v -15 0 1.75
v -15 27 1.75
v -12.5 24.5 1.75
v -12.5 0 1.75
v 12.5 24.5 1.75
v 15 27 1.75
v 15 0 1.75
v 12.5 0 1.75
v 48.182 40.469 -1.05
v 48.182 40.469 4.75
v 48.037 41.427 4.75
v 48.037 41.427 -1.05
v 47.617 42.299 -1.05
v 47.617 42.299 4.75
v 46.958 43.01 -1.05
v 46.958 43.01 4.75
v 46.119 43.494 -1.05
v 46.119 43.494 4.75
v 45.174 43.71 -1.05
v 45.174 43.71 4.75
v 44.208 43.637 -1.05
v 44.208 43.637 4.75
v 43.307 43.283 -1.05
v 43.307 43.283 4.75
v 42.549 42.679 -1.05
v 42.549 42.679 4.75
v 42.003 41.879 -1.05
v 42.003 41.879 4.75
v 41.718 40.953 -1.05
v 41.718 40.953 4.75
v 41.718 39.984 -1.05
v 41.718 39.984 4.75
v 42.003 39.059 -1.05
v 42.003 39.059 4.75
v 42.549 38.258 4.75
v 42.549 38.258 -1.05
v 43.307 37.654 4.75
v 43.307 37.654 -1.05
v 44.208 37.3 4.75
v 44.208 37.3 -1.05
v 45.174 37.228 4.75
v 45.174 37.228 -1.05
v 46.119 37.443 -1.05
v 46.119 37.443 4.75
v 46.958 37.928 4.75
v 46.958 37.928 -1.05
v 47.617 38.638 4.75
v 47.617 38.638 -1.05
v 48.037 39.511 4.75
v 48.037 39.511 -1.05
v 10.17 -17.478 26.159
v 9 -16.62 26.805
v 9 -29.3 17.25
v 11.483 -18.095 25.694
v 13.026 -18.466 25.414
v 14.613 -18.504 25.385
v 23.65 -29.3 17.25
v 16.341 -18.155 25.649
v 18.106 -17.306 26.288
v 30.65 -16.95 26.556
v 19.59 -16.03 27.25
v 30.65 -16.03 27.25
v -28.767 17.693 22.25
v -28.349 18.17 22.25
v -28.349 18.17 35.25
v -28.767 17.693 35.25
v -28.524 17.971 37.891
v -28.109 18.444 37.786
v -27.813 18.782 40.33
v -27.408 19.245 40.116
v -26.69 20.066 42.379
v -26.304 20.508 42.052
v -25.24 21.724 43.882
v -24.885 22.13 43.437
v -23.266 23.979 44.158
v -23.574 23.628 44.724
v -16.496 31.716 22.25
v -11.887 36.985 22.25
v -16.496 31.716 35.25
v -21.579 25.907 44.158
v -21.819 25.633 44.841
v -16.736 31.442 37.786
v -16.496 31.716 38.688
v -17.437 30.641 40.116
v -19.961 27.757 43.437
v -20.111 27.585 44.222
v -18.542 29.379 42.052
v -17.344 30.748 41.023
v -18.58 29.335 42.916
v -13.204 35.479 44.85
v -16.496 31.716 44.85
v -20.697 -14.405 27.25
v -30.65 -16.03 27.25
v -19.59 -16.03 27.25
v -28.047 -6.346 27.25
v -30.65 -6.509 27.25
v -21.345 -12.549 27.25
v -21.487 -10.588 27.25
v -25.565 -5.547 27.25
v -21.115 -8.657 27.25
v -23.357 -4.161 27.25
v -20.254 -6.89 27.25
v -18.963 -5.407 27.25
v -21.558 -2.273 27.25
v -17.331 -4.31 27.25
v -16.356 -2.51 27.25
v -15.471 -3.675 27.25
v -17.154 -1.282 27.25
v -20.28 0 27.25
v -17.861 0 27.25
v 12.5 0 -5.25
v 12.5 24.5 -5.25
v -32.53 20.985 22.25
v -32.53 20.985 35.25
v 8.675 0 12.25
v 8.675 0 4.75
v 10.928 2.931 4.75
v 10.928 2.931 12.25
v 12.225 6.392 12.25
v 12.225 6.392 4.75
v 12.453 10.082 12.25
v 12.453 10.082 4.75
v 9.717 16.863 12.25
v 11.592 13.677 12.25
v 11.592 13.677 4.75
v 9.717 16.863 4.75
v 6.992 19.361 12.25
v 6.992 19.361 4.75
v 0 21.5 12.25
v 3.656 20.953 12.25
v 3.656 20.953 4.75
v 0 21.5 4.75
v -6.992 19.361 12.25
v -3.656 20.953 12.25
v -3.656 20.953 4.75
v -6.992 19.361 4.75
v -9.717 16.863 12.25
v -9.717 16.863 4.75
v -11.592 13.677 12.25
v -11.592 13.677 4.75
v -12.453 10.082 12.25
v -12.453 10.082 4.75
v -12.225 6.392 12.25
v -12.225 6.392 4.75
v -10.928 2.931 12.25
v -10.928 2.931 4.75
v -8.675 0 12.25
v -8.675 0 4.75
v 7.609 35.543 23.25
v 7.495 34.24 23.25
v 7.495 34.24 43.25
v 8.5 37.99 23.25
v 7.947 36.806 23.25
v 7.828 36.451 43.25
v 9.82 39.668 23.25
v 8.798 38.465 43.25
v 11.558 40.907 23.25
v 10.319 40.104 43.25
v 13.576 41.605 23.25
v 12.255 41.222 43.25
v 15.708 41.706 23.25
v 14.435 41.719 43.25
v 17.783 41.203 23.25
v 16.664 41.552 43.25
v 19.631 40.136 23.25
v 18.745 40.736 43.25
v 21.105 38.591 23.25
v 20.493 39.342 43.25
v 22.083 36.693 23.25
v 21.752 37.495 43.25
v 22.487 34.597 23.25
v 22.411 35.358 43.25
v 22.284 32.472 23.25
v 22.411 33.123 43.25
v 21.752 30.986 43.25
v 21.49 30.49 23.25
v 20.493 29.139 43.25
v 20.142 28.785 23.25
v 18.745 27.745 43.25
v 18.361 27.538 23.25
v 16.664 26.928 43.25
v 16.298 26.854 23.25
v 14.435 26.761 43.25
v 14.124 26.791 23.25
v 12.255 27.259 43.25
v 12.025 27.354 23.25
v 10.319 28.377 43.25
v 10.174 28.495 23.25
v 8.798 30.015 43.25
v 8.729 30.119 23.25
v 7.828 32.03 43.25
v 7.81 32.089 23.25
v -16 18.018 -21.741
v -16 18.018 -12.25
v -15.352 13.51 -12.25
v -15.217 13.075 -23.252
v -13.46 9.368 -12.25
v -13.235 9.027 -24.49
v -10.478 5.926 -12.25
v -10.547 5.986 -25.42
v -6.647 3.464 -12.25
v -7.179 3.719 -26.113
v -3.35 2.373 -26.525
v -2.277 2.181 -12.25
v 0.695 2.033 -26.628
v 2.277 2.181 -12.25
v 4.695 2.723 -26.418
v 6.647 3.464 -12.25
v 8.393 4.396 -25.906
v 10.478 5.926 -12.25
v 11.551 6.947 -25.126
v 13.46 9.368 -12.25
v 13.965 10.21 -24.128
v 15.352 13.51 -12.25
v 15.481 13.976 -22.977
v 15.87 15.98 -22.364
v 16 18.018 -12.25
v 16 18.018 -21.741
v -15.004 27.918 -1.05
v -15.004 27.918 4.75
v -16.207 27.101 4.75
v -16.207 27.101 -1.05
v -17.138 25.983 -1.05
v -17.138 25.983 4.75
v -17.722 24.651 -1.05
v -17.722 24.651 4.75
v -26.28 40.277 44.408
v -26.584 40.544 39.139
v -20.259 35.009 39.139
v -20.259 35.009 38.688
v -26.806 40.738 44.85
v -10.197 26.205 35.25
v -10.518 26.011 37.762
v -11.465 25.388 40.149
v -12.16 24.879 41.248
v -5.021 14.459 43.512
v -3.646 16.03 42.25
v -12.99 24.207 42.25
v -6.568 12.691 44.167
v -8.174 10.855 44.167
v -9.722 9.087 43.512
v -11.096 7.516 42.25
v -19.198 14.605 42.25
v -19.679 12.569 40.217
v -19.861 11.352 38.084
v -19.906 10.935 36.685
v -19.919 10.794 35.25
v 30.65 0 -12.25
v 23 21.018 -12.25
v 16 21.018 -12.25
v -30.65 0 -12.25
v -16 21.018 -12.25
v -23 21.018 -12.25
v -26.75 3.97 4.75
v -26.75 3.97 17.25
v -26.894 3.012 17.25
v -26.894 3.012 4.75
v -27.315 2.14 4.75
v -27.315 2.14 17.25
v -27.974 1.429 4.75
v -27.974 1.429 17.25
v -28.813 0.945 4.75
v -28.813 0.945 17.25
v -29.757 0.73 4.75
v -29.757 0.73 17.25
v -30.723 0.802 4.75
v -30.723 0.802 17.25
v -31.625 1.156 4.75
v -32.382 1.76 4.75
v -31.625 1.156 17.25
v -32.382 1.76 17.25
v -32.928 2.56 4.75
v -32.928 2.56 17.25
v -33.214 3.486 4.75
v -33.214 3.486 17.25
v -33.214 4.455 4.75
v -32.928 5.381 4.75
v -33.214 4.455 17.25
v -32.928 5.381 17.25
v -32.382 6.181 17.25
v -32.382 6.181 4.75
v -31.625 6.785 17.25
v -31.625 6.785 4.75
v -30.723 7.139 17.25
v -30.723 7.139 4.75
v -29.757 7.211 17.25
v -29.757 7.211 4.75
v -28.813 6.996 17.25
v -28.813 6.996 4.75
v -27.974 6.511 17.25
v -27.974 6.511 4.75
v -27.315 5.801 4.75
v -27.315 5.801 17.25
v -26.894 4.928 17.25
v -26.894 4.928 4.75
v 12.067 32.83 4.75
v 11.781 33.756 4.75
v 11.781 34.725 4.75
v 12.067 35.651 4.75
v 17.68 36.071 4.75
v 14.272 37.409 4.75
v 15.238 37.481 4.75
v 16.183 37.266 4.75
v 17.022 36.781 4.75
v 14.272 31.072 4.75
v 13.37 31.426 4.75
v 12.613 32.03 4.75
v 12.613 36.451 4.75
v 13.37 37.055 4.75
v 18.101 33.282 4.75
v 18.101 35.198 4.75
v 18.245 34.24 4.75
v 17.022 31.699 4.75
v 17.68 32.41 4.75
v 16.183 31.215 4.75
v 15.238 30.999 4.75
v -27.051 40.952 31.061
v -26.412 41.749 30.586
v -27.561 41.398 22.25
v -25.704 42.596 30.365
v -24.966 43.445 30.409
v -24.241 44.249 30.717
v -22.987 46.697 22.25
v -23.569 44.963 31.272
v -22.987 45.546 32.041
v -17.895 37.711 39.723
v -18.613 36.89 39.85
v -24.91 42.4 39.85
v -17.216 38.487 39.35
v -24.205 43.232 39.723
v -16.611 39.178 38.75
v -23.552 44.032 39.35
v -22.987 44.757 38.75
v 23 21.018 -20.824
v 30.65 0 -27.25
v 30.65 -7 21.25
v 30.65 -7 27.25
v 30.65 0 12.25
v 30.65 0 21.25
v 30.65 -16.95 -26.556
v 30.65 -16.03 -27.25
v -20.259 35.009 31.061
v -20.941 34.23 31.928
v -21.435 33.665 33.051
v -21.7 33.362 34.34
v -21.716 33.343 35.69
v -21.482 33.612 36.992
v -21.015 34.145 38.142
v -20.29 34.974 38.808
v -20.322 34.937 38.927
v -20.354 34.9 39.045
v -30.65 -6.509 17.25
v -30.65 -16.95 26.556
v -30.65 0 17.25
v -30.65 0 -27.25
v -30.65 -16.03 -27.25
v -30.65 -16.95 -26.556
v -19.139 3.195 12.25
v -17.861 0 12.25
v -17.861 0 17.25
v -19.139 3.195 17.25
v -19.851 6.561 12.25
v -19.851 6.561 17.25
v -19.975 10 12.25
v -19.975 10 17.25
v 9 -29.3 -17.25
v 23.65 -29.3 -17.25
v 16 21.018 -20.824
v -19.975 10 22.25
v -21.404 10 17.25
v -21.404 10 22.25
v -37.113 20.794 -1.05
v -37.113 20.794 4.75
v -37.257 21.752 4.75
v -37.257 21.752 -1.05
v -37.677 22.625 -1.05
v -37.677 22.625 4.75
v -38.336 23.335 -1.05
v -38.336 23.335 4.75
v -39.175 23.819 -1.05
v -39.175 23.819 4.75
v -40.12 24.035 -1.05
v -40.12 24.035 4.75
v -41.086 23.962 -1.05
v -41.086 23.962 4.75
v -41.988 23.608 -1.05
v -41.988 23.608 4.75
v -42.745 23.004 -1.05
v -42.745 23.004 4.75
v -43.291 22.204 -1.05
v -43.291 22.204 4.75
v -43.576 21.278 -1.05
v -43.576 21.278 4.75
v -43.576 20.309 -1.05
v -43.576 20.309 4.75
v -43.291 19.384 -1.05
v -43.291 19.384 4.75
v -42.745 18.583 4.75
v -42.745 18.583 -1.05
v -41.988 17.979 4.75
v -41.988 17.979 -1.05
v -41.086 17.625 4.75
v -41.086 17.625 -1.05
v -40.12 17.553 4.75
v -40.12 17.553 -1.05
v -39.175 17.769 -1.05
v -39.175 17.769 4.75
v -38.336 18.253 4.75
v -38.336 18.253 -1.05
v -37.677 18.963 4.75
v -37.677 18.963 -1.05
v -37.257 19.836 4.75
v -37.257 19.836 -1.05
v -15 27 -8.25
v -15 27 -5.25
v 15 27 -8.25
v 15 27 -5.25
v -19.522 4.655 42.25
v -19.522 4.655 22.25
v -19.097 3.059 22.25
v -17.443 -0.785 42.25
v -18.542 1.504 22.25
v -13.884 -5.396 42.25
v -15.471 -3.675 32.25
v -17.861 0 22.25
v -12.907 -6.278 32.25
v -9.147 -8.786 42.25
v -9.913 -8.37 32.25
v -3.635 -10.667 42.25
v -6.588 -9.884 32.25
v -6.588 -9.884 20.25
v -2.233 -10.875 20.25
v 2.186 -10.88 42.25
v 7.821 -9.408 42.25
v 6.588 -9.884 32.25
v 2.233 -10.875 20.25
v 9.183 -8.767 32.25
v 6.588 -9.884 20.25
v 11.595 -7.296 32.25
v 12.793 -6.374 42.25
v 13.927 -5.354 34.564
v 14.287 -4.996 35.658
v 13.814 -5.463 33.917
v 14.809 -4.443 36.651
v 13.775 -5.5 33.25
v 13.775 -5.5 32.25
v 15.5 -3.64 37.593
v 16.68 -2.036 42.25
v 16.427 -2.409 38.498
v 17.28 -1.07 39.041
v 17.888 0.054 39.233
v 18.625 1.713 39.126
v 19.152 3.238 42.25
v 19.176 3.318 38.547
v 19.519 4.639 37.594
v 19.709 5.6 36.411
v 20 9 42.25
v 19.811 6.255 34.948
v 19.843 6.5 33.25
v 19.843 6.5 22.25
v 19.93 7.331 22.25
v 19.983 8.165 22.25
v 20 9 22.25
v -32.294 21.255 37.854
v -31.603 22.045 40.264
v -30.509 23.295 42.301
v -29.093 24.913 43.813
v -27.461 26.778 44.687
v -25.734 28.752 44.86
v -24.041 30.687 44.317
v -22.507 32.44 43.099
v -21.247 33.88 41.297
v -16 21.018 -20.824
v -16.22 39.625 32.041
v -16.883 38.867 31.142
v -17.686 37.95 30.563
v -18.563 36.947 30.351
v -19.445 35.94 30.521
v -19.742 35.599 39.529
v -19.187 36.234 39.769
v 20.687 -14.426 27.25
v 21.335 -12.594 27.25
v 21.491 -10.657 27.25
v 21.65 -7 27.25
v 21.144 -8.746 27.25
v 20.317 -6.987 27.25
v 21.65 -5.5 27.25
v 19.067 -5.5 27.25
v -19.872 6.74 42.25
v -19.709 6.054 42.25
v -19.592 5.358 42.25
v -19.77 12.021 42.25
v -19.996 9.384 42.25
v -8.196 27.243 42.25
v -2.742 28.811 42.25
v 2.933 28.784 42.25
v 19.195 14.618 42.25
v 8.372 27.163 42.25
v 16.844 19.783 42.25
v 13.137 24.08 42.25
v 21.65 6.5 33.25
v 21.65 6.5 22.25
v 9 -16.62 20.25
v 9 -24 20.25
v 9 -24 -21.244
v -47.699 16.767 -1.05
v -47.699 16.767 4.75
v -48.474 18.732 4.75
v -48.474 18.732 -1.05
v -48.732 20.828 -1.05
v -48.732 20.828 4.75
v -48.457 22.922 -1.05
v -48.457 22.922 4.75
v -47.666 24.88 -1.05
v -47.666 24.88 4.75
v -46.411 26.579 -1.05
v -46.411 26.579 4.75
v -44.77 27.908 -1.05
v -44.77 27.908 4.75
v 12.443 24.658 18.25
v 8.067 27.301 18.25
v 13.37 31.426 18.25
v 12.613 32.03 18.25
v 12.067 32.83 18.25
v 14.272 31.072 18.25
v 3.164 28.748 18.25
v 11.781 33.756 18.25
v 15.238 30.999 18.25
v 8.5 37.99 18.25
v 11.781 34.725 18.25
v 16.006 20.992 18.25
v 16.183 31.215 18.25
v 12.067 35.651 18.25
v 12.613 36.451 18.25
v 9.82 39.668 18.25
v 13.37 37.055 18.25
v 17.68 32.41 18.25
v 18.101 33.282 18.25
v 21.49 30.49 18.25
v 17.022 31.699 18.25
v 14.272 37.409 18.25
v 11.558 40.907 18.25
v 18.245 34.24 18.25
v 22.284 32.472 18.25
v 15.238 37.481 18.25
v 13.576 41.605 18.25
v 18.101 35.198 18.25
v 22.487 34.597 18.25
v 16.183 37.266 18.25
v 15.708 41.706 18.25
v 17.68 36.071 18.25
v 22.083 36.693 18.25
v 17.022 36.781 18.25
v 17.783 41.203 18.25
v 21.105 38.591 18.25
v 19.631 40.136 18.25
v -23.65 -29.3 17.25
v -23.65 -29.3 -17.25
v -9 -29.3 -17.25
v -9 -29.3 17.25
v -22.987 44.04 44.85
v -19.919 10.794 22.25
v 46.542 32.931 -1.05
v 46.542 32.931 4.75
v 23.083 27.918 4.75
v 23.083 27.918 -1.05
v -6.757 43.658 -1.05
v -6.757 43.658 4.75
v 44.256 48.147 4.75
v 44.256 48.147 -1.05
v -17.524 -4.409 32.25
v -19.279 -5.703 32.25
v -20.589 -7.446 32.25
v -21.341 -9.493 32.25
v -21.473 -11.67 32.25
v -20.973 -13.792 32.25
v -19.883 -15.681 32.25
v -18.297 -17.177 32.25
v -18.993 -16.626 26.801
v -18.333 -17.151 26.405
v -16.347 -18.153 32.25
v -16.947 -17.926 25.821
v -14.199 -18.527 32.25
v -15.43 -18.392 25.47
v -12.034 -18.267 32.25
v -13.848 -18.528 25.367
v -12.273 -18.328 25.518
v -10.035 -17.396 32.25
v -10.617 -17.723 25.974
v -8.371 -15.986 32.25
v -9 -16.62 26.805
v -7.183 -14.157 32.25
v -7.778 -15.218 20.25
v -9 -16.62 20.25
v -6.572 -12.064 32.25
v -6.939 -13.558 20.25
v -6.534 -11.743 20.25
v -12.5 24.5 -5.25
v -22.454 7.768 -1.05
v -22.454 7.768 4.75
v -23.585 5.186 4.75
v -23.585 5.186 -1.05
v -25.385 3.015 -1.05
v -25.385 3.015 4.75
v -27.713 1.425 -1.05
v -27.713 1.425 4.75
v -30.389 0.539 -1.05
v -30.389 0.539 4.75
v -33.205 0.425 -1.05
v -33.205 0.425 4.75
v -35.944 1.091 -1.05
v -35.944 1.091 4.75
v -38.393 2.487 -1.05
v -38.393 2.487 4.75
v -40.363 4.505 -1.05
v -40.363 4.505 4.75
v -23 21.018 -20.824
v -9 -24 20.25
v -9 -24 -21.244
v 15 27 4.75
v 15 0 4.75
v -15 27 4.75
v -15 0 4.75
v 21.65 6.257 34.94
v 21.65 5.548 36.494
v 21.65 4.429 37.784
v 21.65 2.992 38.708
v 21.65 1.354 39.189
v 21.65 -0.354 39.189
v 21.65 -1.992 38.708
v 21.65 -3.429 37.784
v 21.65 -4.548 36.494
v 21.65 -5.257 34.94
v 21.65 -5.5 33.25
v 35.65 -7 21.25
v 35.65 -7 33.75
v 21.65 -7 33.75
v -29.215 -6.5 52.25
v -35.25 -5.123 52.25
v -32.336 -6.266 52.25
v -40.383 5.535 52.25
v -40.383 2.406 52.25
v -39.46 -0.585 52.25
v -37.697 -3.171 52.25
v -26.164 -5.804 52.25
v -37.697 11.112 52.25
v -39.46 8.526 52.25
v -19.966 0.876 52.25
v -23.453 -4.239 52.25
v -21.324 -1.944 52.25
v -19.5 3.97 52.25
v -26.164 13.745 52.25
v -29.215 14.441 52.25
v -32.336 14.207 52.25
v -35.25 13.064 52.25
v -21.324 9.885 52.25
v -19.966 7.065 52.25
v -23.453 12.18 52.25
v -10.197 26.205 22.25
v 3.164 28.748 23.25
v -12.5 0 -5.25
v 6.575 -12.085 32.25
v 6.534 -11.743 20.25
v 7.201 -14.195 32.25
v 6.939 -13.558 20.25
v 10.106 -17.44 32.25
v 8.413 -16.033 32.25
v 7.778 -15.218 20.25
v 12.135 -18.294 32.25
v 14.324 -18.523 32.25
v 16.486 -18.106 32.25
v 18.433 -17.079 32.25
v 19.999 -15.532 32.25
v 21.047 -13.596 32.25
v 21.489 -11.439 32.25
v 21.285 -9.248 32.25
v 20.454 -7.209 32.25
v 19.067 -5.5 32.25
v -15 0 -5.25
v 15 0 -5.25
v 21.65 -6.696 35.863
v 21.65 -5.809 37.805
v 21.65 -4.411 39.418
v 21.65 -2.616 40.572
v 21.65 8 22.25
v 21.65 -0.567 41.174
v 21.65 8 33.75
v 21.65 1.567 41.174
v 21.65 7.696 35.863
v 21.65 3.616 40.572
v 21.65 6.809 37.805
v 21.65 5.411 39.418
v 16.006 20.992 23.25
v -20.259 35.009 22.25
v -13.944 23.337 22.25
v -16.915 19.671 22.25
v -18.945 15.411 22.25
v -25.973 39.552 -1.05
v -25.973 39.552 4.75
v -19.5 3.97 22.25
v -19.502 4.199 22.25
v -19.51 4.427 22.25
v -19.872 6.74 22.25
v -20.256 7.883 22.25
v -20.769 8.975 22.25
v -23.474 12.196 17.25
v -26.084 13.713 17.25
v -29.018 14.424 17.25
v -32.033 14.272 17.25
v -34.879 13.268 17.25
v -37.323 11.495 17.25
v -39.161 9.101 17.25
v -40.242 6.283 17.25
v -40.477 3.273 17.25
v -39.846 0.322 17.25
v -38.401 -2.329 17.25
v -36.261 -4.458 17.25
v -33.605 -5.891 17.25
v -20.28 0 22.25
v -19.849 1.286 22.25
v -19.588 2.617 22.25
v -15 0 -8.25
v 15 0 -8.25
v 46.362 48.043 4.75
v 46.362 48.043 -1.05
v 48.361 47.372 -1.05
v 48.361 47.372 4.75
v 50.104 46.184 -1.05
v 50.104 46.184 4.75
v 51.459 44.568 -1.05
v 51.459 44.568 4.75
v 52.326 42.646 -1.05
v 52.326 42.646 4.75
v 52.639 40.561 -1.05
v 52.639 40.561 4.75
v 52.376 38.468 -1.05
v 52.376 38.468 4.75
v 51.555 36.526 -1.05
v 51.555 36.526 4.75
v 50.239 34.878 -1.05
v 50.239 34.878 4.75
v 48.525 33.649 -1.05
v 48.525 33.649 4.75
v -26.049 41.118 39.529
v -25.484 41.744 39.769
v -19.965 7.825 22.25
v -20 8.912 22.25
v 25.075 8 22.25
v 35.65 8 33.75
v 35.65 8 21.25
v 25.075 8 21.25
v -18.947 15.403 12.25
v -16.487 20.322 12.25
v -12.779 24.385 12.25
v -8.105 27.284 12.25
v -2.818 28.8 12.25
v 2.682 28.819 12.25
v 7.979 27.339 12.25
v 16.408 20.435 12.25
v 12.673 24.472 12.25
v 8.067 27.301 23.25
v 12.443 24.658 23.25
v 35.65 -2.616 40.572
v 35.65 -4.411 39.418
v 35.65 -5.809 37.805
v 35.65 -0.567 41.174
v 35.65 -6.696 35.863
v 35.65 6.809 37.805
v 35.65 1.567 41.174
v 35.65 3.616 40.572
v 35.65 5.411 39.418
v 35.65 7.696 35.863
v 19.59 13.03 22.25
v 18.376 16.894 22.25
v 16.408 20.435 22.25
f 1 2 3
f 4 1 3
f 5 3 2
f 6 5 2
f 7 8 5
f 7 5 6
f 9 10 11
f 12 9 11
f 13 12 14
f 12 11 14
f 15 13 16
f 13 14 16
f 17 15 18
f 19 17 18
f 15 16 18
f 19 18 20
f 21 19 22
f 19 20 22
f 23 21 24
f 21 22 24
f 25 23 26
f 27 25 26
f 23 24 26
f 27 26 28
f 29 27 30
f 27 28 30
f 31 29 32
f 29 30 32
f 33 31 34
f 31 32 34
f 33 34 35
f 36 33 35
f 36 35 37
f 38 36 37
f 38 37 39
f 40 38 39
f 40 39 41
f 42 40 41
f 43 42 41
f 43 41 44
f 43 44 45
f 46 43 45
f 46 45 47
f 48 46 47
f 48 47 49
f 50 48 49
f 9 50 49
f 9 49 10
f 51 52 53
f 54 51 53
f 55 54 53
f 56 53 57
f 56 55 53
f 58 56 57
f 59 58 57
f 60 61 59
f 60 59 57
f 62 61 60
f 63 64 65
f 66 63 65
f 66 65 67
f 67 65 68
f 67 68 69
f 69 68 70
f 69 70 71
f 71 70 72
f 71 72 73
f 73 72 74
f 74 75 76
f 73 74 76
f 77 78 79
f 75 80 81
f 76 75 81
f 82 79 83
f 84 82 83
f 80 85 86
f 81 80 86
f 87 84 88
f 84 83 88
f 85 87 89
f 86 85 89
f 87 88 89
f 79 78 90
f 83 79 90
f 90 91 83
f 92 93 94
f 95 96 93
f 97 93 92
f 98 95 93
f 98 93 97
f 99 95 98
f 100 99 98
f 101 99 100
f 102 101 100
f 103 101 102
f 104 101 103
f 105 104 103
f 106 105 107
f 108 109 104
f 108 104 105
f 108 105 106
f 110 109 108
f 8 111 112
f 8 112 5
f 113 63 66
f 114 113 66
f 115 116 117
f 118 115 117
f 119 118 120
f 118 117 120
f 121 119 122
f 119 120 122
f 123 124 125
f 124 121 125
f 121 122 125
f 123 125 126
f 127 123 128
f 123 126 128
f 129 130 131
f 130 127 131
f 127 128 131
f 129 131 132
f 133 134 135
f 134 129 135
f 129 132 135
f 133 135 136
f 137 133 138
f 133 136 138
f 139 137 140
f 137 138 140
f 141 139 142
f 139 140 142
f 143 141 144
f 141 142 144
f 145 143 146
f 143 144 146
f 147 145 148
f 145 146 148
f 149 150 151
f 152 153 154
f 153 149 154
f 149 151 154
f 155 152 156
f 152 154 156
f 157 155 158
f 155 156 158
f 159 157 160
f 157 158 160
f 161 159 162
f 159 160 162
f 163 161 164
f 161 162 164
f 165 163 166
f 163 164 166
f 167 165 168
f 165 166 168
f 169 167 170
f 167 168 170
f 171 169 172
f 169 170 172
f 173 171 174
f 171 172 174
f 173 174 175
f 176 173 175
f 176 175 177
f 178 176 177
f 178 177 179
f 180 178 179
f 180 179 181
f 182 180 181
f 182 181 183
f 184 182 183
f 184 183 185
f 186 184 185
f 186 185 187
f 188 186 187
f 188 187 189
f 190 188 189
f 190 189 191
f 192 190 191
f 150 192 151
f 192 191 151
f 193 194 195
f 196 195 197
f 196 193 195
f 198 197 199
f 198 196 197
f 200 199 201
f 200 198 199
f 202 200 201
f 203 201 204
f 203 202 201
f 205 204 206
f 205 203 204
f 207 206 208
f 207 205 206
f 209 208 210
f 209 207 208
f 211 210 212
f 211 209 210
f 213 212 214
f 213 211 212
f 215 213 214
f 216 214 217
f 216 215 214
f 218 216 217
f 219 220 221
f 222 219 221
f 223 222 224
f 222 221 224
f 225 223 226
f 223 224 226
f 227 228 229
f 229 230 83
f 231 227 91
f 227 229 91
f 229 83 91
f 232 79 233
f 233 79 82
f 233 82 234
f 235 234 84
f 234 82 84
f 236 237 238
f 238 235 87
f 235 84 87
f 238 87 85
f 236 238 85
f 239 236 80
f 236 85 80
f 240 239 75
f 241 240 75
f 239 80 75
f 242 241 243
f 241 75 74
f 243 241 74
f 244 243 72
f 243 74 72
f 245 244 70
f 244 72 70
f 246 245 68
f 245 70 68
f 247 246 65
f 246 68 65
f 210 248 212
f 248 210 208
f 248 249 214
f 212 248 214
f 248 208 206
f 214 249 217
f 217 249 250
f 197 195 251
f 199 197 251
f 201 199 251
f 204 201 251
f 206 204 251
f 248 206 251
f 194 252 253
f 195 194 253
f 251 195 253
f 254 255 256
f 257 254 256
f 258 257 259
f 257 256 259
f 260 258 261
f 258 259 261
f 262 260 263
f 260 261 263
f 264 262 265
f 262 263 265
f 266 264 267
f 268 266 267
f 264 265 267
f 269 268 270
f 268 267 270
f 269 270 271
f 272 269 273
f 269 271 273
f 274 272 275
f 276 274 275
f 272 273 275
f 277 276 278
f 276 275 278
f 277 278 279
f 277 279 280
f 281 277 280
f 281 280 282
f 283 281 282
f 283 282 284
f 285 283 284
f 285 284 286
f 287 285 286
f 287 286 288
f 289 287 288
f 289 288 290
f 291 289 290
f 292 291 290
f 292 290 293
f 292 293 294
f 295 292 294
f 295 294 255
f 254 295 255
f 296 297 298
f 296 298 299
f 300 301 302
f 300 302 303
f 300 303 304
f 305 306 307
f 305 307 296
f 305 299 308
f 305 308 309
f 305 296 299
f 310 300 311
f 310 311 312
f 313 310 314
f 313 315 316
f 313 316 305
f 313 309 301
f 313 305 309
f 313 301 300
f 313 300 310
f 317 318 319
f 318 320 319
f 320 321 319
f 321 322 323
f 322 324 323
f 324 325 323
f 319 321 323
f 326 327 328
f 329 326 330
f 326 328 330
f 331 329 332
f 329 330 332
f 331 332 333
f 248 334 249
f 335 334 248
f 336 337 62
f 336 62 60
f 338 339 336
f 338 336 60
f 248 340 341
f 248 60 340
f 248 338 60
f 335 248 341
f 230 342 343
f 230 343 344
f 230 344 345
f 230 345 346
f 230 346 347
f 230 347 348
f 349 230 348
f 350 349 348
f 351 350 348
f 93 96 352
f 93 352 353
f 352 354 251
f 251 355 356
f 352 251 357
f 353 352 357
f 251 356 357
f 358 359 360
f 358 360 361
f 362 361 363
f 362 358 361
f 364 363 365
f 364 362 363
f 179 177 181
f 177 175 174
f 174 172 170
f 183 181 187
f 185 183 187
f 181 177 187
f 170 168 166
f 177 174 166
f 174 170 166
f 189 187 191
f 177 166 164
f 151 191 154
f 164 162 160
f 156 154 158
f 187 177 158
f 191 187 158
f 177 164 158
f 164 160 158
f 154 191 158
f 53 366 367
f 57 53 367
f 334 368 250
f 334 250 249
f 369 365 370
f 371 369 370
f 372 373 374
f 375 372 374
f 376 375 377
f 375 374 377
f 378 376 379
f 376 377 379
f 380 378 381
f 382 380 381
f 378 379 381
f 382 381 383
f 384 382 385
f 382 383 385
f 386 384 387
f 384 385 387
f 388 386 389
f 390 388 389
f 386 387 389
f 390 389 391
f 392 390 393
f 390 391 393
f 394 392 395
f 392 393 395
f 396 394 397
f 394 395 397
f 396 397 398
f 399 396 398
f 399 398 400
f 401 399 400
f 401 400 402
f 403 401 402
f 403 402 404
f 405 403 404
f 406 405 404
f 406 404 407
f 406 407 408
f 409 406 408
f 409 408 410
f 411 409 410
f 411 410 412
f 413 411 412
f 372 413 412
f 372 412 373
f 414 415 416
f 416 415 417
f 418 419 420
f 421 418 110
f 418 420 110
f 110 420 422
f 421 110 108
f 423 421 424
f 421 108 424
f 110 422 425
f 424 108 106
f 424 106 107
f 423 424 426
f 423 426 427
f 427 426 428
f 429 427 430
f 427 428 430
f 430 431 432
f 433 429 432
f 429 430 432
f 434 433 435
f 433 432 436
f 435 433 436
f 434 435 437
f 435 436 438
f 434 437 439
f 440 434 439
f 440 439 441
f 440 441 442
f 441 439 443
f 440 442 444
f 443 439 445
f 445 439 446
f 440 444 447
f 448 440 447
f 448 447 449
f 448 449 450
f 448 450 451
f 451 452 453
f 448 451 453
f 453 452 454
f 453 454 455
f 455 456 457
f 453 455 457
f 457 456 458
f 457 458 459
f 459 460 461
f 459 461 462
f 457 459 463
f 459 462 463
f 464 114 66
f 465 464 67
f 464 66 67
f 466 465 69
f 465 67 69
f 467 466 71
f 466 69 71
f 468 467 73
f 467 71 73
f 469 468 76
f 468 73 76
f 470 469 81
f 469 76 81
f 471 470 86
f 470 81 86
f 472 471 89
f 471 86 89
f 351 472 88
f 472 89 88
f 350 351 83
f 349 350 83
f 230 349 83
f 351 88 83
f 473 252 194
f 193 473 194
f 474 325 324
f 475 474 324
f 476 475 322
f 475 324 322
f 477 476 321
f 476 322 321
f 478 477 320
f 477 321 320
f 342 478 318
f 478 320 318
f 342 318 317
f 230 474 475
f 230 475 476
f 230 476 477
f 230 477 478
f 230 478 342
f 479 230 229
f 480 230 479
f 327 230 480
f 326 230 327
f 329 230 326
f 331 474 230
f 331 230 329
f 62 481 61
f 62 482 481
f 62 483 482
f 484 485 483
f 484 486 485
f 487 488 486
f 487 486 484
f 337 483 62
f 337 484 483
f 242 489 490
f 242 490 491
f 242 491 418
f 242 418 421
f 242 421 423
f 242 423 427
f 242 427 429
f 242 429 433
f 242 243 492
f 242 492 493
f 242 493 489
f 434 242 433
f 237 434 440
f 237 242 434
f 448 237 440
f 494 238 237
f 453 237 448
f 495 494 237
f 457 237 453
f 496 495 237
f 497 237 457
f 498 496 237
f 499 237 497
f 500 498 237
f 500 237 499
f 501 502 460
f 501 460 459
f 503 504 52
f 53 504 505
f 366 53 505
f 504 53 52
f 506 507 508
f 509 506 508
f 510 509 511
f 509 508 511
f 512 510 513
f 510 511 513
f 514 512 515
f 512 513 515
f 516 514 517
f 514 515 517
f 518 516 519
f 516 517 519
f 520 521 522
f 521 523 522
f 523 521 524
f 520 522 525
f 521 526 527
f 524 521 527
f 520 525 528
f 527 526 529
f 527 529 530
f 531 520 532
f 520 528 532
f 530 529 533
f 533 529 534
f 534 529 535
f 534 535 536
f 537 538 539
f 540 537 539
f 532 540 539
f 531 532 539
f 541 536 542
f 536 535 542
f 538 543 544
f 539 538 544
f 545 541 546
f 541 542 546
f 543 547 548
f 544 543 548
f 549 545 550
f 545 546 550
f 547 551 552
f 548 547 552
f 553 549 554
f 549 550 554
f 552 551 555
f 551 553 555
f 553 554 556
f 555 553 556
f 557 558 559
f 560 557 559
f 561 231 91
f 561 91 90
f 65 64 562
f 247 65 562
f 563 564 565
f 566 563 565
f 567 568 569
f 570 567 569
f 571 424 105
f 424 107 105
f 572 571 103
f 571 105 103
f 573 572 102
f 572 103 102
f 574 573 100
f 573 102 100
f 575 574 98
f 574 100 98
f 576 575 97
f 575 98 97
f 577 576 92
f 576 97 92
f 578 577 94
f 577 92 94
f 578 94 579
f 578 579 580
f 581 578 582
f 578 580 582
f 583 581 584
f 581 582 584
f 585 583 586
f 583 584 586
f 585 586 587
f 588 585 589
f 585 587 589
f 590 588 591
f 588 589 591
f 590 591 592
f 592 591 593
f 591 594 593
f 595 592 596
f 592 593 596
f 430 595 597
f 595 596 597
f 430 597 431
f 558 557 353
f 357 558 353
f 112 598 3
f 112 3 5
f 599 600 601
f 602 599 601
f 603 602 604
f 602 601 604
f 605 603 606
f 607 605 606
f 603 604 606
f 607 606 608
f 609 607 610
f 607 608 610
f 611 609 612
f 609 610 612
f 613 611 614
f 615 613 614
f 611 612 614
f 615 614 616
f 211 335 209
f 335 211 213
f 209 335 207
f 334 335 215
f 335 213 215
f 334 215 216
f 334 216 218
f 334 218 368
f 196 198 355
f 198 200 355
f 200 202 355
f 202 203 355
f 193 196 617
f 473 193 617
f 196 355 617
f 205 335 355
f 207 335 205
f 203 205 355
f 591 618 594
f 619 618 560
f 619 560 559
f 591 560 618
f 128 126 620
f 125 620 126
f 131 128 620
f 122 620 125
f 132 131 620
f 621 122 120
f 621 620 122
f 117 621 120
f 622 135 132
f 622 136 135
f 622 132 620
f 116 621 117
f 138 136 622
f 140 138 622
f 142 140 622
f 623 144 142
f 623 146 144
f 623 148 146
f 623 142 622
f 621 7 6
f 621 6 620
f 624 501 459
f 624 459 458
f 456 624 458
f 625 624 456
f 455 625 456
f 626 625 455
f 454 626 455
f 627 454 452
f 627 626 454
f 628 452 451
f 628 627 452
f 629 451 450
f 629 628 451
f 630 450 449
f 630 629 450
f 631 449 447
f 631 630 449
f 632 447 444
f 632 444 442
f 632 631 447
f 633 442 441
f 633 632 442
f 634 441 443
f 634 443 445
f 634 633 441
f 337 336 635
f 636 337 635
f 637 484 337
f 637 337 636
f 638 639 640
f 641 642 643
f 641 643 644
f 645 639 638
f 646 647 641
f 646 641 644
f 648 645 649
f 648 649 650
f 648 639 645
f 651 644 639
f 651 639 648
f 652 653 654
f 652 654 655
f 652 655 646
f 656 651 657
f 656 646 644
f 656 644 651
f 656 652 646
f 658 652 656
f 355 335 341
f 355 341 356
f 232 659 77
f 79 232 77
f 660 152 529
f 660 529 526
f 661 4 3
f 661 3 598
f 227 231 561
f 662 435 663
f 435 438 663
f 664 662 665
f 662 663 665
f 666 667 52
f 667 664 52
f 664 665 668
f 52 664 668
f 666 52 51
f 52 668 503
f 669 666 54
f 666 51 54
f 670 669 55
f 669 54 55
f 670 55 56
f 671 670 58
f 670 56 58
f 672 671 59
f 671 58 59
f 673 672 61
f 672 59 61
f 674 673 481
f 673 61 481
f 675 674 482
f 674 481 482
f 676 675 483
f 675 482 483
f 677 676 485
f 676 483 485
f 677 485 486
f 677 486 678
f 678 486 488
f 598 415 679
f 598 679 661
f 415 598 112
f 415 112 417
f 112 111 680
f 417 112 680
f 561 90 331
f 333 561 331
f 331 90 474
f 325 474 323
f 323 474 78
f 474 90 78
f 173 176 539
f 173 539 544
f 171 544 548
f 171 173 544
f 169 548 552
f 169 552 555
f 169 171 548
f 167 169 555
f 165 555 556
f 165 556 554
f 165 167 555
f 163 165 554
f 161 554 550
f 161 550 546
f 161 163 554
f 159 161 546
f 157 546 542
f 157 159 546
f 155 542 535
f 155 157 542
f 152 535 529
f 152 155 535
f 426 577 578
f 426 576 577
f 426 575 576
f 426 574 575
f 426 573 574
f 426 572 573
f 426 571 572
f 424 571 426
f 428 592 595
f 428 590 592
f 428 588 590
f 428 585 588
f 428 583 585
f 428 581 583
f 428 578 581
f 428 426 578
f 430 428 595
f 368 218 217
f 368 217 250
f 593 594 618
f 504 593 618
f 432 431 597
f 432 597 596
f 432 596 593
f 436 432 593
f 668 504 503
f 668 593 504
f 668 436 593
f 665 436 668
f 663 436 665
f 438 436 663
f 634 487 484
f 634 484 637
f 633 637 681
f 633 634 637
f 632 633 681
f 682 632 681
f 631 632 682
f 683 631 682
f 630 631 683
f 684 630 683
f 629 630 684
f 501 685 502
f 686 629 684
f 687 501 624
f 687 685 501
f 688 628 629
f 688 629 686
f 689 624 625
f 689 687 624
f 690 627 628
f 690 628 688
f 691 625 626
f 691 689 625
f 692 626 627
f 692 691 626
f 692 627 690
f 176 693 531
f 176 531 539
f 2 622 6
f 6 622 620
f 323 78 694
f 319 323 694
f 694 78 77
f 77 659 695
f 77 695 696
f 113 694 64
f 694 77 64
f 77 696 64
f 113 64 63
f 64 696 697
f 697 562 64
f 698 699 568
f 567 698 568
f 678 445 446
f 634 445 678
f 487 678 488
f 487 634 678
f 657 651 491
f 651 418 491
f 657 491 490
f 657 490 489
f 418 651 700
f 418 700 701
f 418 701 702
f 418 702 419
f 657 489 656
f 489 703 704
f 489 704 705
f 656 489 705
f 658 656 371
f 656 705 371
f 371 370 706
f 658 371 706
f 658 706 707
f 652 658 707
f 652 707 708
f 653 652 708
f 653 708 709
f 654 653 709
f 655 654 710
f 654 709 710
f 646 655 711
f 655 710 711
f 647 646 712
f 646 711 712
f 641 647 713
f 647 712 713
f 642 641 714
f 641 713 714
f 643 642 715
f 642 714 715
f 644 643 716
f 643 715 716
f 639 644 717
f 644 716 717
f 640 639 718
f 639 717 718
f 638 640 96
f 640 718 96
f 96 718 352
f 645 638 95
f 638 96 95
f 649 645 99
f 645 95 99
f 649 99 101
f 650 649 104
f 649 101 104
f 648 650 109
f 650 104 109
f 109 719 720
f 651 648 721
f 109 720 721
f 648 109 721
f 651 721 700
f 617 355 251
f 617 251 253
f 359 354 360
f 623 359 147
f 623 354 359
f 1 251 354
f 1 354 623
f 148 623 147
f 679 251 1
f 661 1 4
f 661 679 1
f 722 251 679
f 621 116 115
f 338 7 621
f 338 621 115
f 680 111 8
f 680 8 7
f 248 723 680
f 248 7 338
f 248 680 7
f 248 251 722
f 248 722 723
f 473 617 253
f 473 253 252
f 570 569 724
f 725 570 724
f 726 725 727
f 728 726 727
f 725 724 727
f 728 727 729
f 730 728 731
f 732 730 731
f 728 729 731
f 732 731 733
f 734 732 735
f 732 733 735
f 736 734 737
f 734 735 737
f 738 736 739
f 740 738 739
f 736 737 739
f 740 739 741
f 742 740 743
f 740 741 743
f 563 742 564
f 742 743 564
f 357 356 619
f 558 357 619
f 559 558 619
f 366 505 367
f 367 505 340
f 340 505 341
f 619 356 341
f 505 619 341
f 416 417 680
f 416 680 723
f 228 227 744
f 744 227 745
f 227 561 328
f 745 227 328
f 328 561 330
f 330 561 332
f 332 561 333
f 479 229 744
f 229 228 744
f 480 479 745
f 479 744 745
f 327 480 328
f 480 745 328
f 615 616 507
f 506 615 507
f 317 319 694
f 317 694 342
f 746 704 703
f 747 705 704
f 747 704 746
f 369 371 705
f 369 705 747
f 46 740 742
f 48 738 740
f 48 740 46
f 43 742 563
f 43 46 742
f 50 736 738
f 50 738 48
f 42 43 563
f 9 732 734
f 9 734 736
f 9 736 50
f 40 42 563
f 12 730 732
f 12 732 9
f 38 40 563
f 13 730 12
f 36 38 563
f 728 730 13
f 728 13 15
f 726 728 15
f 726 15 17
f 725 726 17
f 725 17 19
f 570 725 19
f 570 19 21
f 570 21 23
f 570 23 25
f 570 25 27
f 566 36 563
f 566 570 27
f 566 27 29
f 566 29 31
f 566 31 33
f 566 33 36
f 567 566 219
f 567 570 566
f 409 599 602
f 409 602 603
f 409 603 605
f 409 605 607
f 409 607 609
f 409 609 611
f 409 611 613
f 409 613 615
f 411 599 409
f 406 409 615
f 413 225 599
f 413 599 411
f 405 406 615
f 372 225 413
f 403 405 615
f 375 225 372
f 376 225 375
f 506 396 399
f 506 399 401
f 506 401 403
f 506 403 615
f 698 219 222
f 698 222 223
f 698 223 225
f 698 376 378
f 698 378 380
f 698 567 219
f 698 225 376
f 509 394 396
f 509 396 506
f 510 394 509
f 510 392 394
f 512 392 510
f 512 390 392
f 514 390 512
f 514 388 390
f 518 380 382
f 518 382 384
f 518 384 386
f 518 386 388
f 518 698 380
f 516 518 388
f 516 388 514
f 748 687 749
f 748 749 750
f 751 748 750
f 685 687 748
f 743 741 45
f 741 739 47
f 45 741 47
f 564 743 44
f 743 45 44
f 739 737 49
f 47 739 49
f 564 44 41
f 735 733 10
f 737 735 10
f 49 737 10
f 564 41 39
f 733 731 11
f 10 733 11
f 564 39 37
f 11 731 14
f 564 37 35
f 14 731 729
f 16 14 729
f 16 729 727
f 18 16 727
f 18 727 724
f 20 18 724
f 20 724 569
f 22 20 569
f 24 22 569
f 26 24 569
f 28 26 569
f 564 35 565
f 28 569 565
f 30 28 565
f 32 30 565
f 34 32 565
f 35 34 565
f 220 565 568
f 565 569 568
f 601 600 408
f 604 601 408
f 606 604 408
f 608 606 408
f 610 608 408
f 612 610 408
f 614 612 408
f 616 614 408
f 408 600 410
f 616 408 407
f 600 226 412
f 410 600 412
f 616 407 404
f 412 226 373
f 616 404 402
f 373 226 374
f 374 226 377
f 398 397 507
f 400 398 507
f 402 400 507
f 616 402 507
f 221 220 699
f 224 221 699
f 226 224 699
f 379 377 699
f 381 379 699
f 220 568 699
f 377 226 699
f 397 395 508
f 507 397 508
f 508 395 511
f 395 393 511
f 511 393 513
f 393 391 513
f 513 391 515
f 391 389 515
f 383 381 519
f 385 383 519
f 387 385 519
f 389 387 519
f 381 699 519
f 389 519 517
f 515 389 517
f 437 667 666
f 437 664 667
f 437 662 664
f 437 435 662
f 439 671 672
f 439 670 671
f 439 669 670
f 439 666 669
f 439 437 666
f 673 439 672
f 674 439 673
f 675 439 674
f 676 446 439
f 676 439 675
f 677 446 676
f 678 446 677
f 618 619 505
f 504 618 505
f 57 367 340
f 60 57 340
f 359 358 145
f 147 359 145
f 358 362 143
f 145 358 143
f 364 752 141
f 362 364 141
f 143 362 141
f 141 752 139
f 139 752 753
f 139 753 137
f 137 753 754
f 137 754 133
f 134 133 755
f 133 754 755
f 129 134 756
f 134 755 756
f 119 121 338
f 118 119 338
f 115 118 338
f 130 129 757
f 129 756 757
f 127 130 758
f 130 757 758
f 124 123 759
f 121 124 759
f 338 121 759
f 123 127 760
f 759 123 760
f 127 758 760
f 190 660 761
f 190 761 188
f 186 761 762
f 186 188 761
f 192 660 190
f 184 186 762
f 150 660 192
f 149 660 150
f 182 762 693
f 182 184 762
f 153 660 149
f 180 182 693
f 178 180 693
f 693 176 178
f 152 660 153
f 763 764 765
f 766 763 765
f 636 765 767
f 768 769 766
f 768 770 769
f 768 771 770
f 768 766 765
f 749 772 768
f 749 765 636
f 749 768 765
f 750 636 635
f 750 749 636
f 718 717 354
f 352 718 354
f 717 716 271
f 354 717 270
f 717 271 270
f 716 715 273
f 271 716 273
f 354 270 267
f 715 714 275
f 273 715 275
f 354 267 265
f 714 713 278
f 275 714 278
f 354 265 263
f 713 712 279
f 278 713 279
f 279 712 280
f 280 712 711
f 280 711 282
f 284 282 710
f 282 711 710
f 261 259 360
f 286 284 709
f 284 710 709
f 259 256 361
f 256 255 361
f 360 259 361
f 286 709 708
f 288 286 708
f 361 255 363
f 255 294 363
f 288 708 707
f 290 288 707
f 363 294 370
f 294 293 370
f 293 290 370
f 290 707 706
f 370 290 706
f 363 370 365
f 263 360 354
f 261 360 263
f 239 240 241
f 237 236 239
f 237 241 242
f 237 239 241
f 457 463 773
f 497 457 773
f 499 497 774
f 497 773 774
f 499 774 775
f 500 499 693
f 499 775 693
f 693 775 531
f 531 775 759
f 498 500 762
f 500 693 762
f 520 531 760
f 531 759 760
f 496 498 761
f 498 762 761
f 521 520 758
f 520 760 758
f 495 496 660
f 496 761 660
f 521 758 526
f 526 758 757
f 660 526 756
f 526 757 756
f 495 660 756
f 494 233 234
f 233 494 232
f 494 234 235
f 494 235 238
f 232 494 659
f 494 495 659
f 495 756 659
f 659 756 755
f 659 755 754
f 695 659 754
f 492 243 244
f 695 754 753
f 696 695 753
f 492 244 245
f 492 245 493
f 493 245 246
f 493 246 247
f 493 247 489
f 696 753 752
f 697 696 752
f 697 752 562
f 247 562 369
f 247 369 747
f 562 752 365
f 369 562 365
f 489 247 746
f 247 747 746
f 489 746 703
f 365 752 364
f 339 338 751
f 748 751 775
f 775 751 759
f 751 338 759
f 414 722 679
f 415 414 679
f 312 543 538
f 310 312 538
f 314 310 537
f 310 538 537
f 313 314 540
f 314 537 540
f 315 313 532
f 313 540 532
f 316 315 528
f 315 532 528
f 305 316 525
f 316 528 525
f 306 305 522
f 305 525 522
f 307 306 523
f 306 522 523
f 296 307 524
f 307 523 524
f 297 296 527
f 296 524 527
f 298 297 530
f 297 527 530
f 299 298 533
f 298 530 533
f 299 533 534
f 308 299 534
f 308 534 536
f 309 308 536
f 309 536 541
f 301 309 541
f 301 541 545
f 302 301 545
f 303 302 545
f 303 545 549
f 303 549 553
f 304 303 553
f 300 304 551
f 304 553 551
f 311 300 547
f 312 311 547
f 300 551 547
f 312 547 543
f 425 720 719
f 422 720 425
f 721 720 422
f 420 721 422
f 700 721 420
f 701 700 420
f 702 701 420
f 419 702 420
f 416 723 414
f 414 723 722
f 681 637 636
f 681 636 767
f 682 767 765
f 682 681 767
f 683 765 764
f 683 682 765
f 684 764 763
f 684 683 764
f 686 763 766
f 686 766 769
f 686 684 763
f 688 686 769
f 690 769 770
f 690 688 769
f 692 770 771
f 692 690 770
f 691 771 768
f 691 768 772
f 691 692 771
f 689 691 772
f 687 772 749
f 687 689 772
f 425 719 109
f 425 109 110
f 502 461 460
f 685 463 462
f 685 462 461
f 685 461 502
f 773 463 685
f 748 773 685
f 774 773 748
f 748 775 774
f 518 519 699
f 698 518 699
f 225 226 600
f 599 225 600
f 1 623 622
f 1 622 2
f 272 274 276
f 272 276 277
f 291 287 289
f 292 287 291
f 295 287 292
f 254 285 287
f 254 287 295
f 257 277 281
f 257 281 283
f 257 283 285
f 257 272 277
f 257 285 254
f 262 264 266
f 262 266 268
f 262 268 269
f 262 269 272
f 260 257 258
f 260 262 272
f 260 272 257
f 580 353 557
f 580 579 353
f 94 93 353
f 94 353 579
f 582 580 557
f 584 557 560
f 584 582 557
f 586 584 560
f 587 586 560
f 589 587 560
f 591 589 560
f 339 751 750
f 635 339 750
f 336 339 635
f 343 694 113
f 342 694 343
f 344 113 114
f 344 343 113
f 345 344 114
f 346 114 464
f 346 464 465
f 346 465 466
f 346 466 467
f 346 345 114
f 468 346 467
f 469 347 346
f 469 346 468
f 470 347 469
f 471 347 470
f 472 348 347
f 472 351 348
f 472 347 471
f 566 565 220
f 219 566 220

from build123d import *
from build123d.topology import SkipClean

# Parameters (mm, degrees)
CROQUIS4_W                    = 61.3
CROQUIS4_H                    = 54.5
SALIENTE_EXTRUIR1_DEPTH       = 29.3
CORTAR_EXTRUIR1_REACH         = 71.052
CROQUIS5_W                    = 18
CROQUIS5_H                    = 5.3
CHAFL_N2_SIZE                 = 10
CHAFL_N2_SIZE2                = 13.270448216
CROQUIS6_W                    = 18
CROQUIS6_H                    = 14.970448216
CORTAR_EXTRUIR2_DEPTH         = 7
SALIENTE_EXTRUIR2_DEPTH       = 15
SALIENTE_EXTRUIR2_DEPTH_BACK  = 15
CROQUIS7_R                    = 20
SALIENTE_EXTRUIR3_DEPTH       = 5
SALIENTE_EXTRUIR3_DEPTH_BACK  = 15
CROQUIS8_R                    = 7.5
SALIENTE_EXTRUIR4_DEPTH       = 25
SALIENTE_EXTRUIR4_DEPTH_BACK  = 10
CROQUIS9_R                    = 10.5
SALIENTE_EXTRUIR5_DEPTH       = 5
SALIENTE_EXTRUIR5_DEPTH_BACK  = 9
SALIENTE_EXTRUIR6_DEPTH       = 24
SALIENTE_EXTRUIR8_DEPTH       = 3
SALIENTE_EXTRUIR8_DEPTH_BACK  = 10
SALIENTE_EXTRUIR9_DEPTH       = 20
SALIENTE_EXTRUIR10_DEPTH      = 3
SALIENTE_EXTRUIR10_DEPTH_BACK = 2
SALIENTE_EXTRUIR11_START      = -25
CROQUIS17_R                   = 7.5
SALIENTE_EXTRUIR11_DEPTH      = 25
SALIENTE_EXTRUIR12_DEPTH      = 10
SALIENTE_EXTRUIR13_DEPTH      = 15
SALIENTE_EXTRUIR14_DEPTH      = 27
CROQUIS21_W                   = 25
CROQUIS21_H                   = 7
CORTAR_EXTRUIR3_DEPTH         = 2.5
SALIENTE_EXTRUIR15_START      = -17.5
CROQUIS22_R                   = 12.5
SALIENTE_EXTRUIR15_DEPTH      = 7.5
SALIENTE_EXTRUIR16_DEPTH      = 5.8
CORTAR_EXTRUIR5_START         = 12.25
CORTAR_EXTRUIR5_DEPTH         = 5
CROQUIS26_R                   = 3.25
SALIENTE_EXTRUIR17_DEPTH      = 13.5
CROQUIS25_R                   = 3.25
CORTAR_EXTRUIR7_DEPTH         = 86.721773981
CORTAR_EXTRUIR8_DEPTH         = 110.490999901
SALIENTE_EXTRUIR18_DEPTH      = 15
SALIENTE_EXTRUIR19_DEPTH      = 5
CROQUIS30_R                   = 4.75
CORTAR_EXTRUIR9_DEPTH         = 10
CORTAR_EXTRUIR10_DEPTH        = 10


# Read off the part's stored shape, not the designer's step: Cortar-Extruir5
with BuildPart() as part:
    # Croquis4 → Saliente-Extruir1 (new body)
    with BuildSketch(Plane(origin=(0, 0, 0), x_dir=(1, 0, 0), z_dir=(0, 1, 0))):
        Rectangle(CROQUIS4_W, CROQUIS4_H)
    extrude(amount=-SALIENTE_EXTRUIR1_DEPTH)

    # Croquis5 → Cortar-Extruir1 (cut, up to next)
    with BuildSketch(Plane.XY.offset(27.25), mode=Mode.PRIVATE) as cortar_extruir1_sk1:
        with Locations((0, -26.65)):
            Rectangle(CROQUIS5_W, CROQUIS5_H)
    cortar_extruir1_tool1 = extrude(cortar_extruir1_sk1.sketch, amount=-CORTAR_EXTRUIR1_REACH, mode=Mode.PRIVATE) & part.part
    # Croquis5 → Cortar-Extruir1 (cut, up to next)
    with BuildSketch(Plane.XY.offset(27.25), mode=Mode.PRIVATE) as cortar_extruir1_sk2:
        Polygon((-23.65, -29.3), (-30.65, -16.95), (-30.65, -29.3), align=None)
    cortar_extruir1_tool2 = extrude(cortar_extruir1_sk2.sketch, amount=-CORTAR_EXTRUIR1_REACH, mode=Mode.PRIVATE) & part.part
    # Croquis5 → Cortar-Extruir1 (cut, up to next)
    with BuildSketch(Plane.XY.offset(27.25), mode=Mode.PRIVATE) as cortar_extruir1_sk3:
        Polygon((23.65, -29.3), (30.65, -16.95), (30.65, -29.3), align=None)
    cortar_extruir1_tool3 = extrude(cortar_extruir1_sk3.sketch, amount=-CORTAR_EXTRUIR1_REACH, mode=Mode.PRIVATE) & part.part
    add(cortar_extruir1_tool1.solids().sort_by_distance((0, -26.65, 27.25))[0], mode=Mode.SUBTRACT)
    add(cortar_extruir1_tool2.solids().sort_by_distance((-28.316667, -25.183333, 27.25))[0], mode=Mode.SUBTRACT)
    add(cortar_extruir1_tool3.solids().sort_by_distance((28.316667, -25.183333, 27.25))[0], mode=Mode.SUBTRACT)

    # Chaflán2
    chafl_n2_edges = [part.edges().sort_by_distance(p)[0] for p in [
        (16.325, -29.3, -27.25),
        (16.325, -29.3, 27.25),
    ]]
    chafl_n2_side = [part.faces().sort_by_distance(p)[0] for p in [
        (16.325, -29.3, 0),
    ]]
    chamfer(chafl_n2_edges, length=CHAFL_N2_SIZE, length2=CHAFL_N2_SIZE2, reference=chafl_n2_side[0])

    # Croquis6 → Cortar-Extruir2 (cut)
    with BuildSketch(Plane.XY.offset(27.25)):
        with Locations((0, -16.514775892)):
            Rectangle(CROQUIS6_W, CROQUIS6_H)
    extrude(amount=-CORTAR_EXTRUIR2_DEPTH, mode=Mode.SUBTRACT)

    # Croquis7 → Saliente-Extruir2 (add, two sides: drawn at the far end of the back side and taken through both)
    with BuildSketch(Plane.XY.offset(27.25).offset(-SALIENTE_EXTRUIR2_DEPTH_BACK)):
        with Locations((0, 9)):
            Circle(CROQUIS7_R)
    extrude(amount=SALIENTE_EXTRUIR2_DEPTH + SALIENTE_EXTRUIR2_DEPTH_BACK)

    # Croquis8 → Saliente-Extruir3 (add, two sides: drawn at the far end of the back side and taken through both)
    with BuildSketch(Plane.XY.offset(27.25).offset(-SALIENTE_EXTRUIR3_DEPTH_BACK)):
        with Locations((14, -11.029551784)):
            Circle(CROQUIS8_R)
        with Locations((-14, -11.029551784)):
            Circle(CROQUIS8_R)
    extrude(amount=SALIENTE_EXTRUIR3_DEPTH + SALIENTE_EXTRUIR3_DEPTH_BACK)

    # Croquis9 → Saliente-Extruir4 (add, two sides: drawn at the far end of the back side and taken through both)
    with BuildSketch(Plane.XY.offset(27.25).offset(-SALIENTE_EXTRUIR4_DEPTH_BACK)):
        with Locations((-30, 3.970448216)):
            Circle(CROQUIS9_R)
    extrude(amount=SALIENTE_EXTRUIR4_DEPTH + SALIENTE_EXTRUIR4_DEPTH_BACK)

    # Croquis11 → Saliente-Extruir5 (add, two sides: drawn at the far end of the back side and taken through both)
    with BuildSketch(Plane(origin=(30.65, 0, 0), x_dir=(0, 0, -1), z_dir=(1, 0, 0)).offset(-SALIENTE_EXTRUIR5_DEPTH_BACK)):
        with BuildLine():
            Line((-21.25, -7), (-33.75, -7))
            ThreePointArc((-33.75, -7), (-41.25, 0.5), (-33.75, 8))
            Line((-33.75, 8), (-21.25, 8))
            Line((-21.25, 8), (-21.25, -7))
        make_face()
    extrude(amount=SALIENTE_EXTRUIR5_DEPTH + SALIENTE_EXTRUIR5_DEPTH_BACK)

    # Croquis12 → Saliente-Extruir6 (add)
    with BuildSketch(Plane(origin=(35.65, 0, 0), x_dir=(0, 0, -1), z_dir=(1, 0, 0))):
        with BuildLine():
            Line((-21.25, -5.5), (-21.25, 6.5))
            Line((-21.25, 6.5), (-33.25, 6.5))
            ThreePointArc((-33.25, 6.5), (-39.25, 0.5), (-33.25, -5.5))
            Line((-33.25, -5.5), (-21.25, -5.5))
        make_face()
    extrude(amount=-SALIENTE_EXTRUIR6_DEPTH)

    # Croquis14 → Saliente-Extruir8 (add, two sides: drawn at the far end of the back side and taken through both)
    with BuildSketch(Plane.XY.offset(32.25).offset(-SALIENTE_EXTRUIR8_DEPTH_BACK)):
        Polygon((-1.444534472, 18.546380505), (-16.496068366, 31.716472662), (-28.349151308, 18.170092157), (-13.297617414, 5), align=None)
    extrude(amount=SALIENTE_EXTRUIR8_DEPTH + SALIENTE_EXTRUIR8_DEPTH_BACK)

    # Croquis15 → Saliente-Extruir9 (add)
    with BuildSketch(Plane(origin=(-25.060803934, 21.928203442, 0), x_dir=(0, 0, 1), z_dir=(-0.7525766947068787, 0.6585046078685173, 0))):
        with BuildLine():
            Line((35.25, -4.993658867), (35.25, 13.006341133))
            ThreePointArc((35.25, 13.006341133), (44.25, 4.006341133), (35.25, -4.993658867))
        make_face()
    extrude(amount=-SALIENTE_EXTRUIR9_DEPTH)

    # Croquis16 → Saliente-Extruir10 (add, two sides: drawn at the far end of the back side and taken through both)
    with BuildSketch(Plane(origin=(0, 0, 21.25), x_dir=(-1, 0, 0), z_dir=(0, 0, -1)).offset(-SALIENTE_EXTRUIR10_DEPTH_BACK)):
        with BuildLine():
            Line((-8.5, 37.990381057), (-1, 25))
            Line((-1, 25), (-13.990381057, 17.5))
            Line((-13.990381057, 17.5), (-21.490381057, 30.490381057))
            ThreePointArc((-21.490381057, 30.490381057), (-18.745190528, 40.735571585), (-8.5, 37.990381057))
        make_face()
    extrude(amount=SALIENTE_EXTRUIR10_DEPTH + SALIENTE_EXTRUIR10_DEPTH_BACK)

    # Croquis17 → Saliente-Extruir11 (add)
    with SkipClean():  # the faces are left unmerged after this step: merging them gives an invalid solid
        with BuildSketch(Plane(origin=(0, 0, 18.25), x_dir=(-1, 0, 0), z_dir=(0, 0, -1)).offset(SALIENTE_EXTRUIR11_START)):
            with Locations((-14.995190528, 34.240381057)):
                Circle(CROQUIS17_R)
        extrude(amount=SALIENTE_EXTRUIR11_DEPTH)
    add(part.part.scale(1), mode=Mode.REPLACE)  # the faces are merged on a copy

    # Croquis18 → Saliente-Extruir12 (add)
    with BuildSketch(Plane.XY.offset(12.25)):
        with BuildLine():
            Line((30.65, 0), (16.408390364, 20.435240517))
            ThreePointArc((16.408390364, 20.435240517), (-5.51395587, 28.224887273), (-19.974984355, 10))
            Line((-19.974984355, 10), (-30.65, 10))
            Line((-30.65, 10), (-30.65, 0))
            Line((-30.65, 0), (30.65, 0))
        make_face()
    extrude(amount=SALIENTE_EXTRUIR12_DEPTH)

    # Croquis19 → Saliente-Extruir13 (add)
    with BuildSketch(Plane(origin=(0, 0, -27.25), x_dir=(-1, 0, 0), z_dir=(0, 0, -1))):
        with BuildLine():
            Line((-30.65, 0), (30.65, 0))
            Line((30.65, 0), (23, 21.018202259))
            Line((23, 21.018202259), (16, 21.018202259))
            Line((16, 21.018202259), (16, 18.018202259))
            ThreePointArc((16, 18.018202259), (0, 2.018202259), (-16, 18.018202259))
            Line((-16, 18.018202259), (-16, 21.018202259))
            Line((-16, 21.018202259), (-23, 21.018202259))
            Line((-23, 21.018202259), (-30.65, 0))
        make_face()
    extrude(amount=-SALIENTE_EXTRUIR13_DEPTH)

    # Croquis20 → Saliente-Extruir14 (add)
    with BuildSketch(Plane(origin=(0, 0, 0), x_dir=(1, 0, 0), z_dir=(0, 1, 0))):
        Polygon((-15, 5.25), (-12.5, 5.25), (-12.5, 1.75), (12.5, 1.75), (12.5, 5.25), (15, 5.25), (15, 8.25), (-15, 8.25), align=None)
    saliente_extruir14 = extrude(amount=SALIENTE_EXTRUIR14_DEPTH)

    # Simetría1: Saliente-Extruir14 across plane
    add(saliente_extruir14.mirror(Plane(origin=(-12.5, 27, -1.75), x_dir=(1, 0, 0), z_dir=(0, 0, -1))))

    # Croquis21 → Cortar-Extruir3 (cut)
    with SkipClean():  # the faces are left unmerged after this step: merging them gives an invalid solid
        with BuildSketch(Plane(origin=(0, 27, 0), x_dir=(1, 0, 0), z_dir=(0, 1, 0))):
            with Locations((0, 1.75)):
                Rectangle(CROQUIS21_W, CROQUIS21_H)
        extrude(amount=-CORTAR_EXTRUIR3_DEPTH, mode=Mode.SUBTRACT)

    # Croquis22 → Saliente-Extruir15 (add)
    with BuildSketch(Plane.XY.offset(22.25).offset(SALIENTE_EXTRUIR15_START)):
        with Locations((0, 9)):
            Circle(CROQUIS22_R)
    extrude(amount=SALIENTE_EXTRUIR15_DEPTH)

    # Cortar-Extruir5 outline → Cortar-Extruir5 (cut)
    with BuildSketch(Plane.XY.offset(CORTAR_EXTRUIR5_START)):
        with BuildLine():
            Line((-30.65, 10), (-30.65, 0))
            Line((-30.65, 0), (-17.860571099, 0))
            ThreePointArc((-17.860571099, 0), (-19.567378827, 4.862647482), (-19.974984355, 10))
            Line((-19.974984355, 10), (-30.65, 10))
        make_face()
    extrude(amount=CORTAR_EXTRUIR5_DEPTH, mode=Mode.SUBTRACT)

    # Croquis26 → Saliente-Extruir17 (add)
    with BuildSketch(Plane(origin=(0, 0, 18.25), x_dir=(-1, 0, 0), z_dir=(0, 0, -1))):
        with Locations(Location((-14.995190528, 34.240381057, 0), (0, 0, 180))):
            Circle(CROQUIS26_R)
        with Locations(Location((30, 3.970448216, 0), (0, 0, 180))):
            Circle(CROQUIS26_R)
    extrude(amount=SALIENTE_EXTRUIR17_DEPTH)

    # Croquis27 → Cortar-Extruir8 (cut, through all)
    with BuildSketch(Plane.ZY.offset(30.65)):
        Polygon((-27.25, 0), (-20.8240907, 21.018202259), (-27.25, 21.018202259), align=None)
    extrude(amount=-CORTAR_EXTRUIR8_DEPTH, mode=Mode.SUBTRACT)



with BuildPart() as body_2:
    # Croquis23 → Saliente-Extruir16 (new body)
    with BuildSketch(Plane.XY.offset(4.75)):
        with BuildLine():
            Line((-44.769767109, 27.908415043), (-25.972539186, 39.552194376))
            Line((-25.972539186, 39.552194376), (-6.757184018, 43.658324942))
            Line((-6.757184018, 43.658324942), (44.255864102, 48.147303088))
            ThreePointArc((44.255864102, 48.147303088), (52.554253117, 41.614111004), (46.54236984, 32.930614098))
            Line((46.54236984, 32.930614098), (23.082876702, 27.917553398))
            Line((23.082876702, 27.917553398), (-15.00360208, 27.917553398))
            ThreePointArc((-15.00360208, 27.917553398), (-16.711872119, 26.574707218), (-17.722383152, 24.651093472))
            Line((-17.722383152, 24.651093472), (-22.454082276, 7.767654496))
            ThreePointArc((-22.454082276, 7.767654496), (-30.388566077, 0.538919139), (-40.362723642, 4.504625749))
            Line((-40.362723642, 4.504625749), (-47.698970473, 16.766677308))
            ThreePointArc((-47.698970473, 16.766677308), (-48.456597665, 22.921778226), (-44.769767109, 27.908415043))
        make_face()
    extrude(amount=-SALIENTE_EXTRUIR16_DEPTH)

    # Croquis25 → Cortar-Extruir7 (cut, through all)
    with BuildSketch(Plane.XY.offset(4.75)):
        with Locations((44.93155545, 40.468701384)):
            Circle(CROQUIS25_R)
        with Locations((-40.362723642, 20.793869315)):
            Circle(CROQUIS25_R)
    extrude(amount=-CORTAR_EXTRUIR7_DEPTH, mode=Mode.SUBTRACT)


with BuildPart() as body_3:
    # Croquis28 → Saliente-Extruir18 (new body)
    with BuildSketch(Plane(origin=(-25.060803934, 21.928203442, 0), x_dir=(0, 0, 1), z_dir=(-0.7525766947068789, 0.6585046078685171, 0))):
        Polygon((22.25, 13.006341133), (44.85, 13.006341133), (44.85, 18.006341133), (22.25, 20.006341133), align=None)
    extrude(amount=SALIENTE_EXTRUIR18_DEPTH)


with BuildPart() as part_1:
    add(part.part)

    add(body_3.part)  # Saliente-Extruir19 merges body 3
    # Croquis29 → Saliente-Extruir19 (add)
    with BuildSketch(Plane(origin=(-25.060803934, 21.928203442, 0), x_dir=(0, 0, 1), z_dir=(-0.7525766947068789, 0.6585046078685171, 0))):
        with BuildLine():
            Line((22.25, 13.640534559), (22.25, -5.627852293))
            Line((22.25, -5.627852293), (35.25, -5.627852293))
            ThreePointArc((35.25, -5.627852293), (44.884193426, 4.006341133), (35.25, 13.640534559))
            Line((35.25, 13.640534559), (22.25, 13.640534559))
        make_face()
    extrude(amount=SALIENTE_EXTRUIR19_DEPTH)

    # Croquis30 → Cortar-Extruir9 (cut)
    with SkipClean():  # the faces are left unmerged after this step: merging them gives an invalid solid
        with BuildSketch(Plane(origin=(-36.349454354, 31.80577256, 0), x_dir=(0, 0, 1), z_dir=(-0.7525766947068789, 0.6585046078685171, 0))):
            with Locations((35.1, 15.506341133)):
                Circle(CROQUIS30_R)
        extrude(amount=-CORTAR_EXTRUIR9_DEPTH, mode=Mode.SUBTRACT)

    # Croquis31 → Cortar-Extruir10 (cut)
    with SkipClean():  # the faces are left unmerged after this step: merging them gives an invalid solid
        with BuildSketch(Plane(origin=(14.358433284, 16.409638039, 1.929611118), x_dir=(0.7548120551736586, -0.6514526302698987, -0.07660438550728446), z_dir=(0.6559411264469686, 0.7496470016536806, 0.08815107229710104))):
            Polygon((-49.476522514, -39.399877092), (-49.476522514, -14.485376724), (-51.166286947, -14.485376724), (-53.380891791, -41.459110359), align=None)
        extrude(amount=-CORTAR_EXTRUIR10_DEPTH, mode=Mode.SUBTRACT)


solid = Compound([body_2.part, part_1.part])
